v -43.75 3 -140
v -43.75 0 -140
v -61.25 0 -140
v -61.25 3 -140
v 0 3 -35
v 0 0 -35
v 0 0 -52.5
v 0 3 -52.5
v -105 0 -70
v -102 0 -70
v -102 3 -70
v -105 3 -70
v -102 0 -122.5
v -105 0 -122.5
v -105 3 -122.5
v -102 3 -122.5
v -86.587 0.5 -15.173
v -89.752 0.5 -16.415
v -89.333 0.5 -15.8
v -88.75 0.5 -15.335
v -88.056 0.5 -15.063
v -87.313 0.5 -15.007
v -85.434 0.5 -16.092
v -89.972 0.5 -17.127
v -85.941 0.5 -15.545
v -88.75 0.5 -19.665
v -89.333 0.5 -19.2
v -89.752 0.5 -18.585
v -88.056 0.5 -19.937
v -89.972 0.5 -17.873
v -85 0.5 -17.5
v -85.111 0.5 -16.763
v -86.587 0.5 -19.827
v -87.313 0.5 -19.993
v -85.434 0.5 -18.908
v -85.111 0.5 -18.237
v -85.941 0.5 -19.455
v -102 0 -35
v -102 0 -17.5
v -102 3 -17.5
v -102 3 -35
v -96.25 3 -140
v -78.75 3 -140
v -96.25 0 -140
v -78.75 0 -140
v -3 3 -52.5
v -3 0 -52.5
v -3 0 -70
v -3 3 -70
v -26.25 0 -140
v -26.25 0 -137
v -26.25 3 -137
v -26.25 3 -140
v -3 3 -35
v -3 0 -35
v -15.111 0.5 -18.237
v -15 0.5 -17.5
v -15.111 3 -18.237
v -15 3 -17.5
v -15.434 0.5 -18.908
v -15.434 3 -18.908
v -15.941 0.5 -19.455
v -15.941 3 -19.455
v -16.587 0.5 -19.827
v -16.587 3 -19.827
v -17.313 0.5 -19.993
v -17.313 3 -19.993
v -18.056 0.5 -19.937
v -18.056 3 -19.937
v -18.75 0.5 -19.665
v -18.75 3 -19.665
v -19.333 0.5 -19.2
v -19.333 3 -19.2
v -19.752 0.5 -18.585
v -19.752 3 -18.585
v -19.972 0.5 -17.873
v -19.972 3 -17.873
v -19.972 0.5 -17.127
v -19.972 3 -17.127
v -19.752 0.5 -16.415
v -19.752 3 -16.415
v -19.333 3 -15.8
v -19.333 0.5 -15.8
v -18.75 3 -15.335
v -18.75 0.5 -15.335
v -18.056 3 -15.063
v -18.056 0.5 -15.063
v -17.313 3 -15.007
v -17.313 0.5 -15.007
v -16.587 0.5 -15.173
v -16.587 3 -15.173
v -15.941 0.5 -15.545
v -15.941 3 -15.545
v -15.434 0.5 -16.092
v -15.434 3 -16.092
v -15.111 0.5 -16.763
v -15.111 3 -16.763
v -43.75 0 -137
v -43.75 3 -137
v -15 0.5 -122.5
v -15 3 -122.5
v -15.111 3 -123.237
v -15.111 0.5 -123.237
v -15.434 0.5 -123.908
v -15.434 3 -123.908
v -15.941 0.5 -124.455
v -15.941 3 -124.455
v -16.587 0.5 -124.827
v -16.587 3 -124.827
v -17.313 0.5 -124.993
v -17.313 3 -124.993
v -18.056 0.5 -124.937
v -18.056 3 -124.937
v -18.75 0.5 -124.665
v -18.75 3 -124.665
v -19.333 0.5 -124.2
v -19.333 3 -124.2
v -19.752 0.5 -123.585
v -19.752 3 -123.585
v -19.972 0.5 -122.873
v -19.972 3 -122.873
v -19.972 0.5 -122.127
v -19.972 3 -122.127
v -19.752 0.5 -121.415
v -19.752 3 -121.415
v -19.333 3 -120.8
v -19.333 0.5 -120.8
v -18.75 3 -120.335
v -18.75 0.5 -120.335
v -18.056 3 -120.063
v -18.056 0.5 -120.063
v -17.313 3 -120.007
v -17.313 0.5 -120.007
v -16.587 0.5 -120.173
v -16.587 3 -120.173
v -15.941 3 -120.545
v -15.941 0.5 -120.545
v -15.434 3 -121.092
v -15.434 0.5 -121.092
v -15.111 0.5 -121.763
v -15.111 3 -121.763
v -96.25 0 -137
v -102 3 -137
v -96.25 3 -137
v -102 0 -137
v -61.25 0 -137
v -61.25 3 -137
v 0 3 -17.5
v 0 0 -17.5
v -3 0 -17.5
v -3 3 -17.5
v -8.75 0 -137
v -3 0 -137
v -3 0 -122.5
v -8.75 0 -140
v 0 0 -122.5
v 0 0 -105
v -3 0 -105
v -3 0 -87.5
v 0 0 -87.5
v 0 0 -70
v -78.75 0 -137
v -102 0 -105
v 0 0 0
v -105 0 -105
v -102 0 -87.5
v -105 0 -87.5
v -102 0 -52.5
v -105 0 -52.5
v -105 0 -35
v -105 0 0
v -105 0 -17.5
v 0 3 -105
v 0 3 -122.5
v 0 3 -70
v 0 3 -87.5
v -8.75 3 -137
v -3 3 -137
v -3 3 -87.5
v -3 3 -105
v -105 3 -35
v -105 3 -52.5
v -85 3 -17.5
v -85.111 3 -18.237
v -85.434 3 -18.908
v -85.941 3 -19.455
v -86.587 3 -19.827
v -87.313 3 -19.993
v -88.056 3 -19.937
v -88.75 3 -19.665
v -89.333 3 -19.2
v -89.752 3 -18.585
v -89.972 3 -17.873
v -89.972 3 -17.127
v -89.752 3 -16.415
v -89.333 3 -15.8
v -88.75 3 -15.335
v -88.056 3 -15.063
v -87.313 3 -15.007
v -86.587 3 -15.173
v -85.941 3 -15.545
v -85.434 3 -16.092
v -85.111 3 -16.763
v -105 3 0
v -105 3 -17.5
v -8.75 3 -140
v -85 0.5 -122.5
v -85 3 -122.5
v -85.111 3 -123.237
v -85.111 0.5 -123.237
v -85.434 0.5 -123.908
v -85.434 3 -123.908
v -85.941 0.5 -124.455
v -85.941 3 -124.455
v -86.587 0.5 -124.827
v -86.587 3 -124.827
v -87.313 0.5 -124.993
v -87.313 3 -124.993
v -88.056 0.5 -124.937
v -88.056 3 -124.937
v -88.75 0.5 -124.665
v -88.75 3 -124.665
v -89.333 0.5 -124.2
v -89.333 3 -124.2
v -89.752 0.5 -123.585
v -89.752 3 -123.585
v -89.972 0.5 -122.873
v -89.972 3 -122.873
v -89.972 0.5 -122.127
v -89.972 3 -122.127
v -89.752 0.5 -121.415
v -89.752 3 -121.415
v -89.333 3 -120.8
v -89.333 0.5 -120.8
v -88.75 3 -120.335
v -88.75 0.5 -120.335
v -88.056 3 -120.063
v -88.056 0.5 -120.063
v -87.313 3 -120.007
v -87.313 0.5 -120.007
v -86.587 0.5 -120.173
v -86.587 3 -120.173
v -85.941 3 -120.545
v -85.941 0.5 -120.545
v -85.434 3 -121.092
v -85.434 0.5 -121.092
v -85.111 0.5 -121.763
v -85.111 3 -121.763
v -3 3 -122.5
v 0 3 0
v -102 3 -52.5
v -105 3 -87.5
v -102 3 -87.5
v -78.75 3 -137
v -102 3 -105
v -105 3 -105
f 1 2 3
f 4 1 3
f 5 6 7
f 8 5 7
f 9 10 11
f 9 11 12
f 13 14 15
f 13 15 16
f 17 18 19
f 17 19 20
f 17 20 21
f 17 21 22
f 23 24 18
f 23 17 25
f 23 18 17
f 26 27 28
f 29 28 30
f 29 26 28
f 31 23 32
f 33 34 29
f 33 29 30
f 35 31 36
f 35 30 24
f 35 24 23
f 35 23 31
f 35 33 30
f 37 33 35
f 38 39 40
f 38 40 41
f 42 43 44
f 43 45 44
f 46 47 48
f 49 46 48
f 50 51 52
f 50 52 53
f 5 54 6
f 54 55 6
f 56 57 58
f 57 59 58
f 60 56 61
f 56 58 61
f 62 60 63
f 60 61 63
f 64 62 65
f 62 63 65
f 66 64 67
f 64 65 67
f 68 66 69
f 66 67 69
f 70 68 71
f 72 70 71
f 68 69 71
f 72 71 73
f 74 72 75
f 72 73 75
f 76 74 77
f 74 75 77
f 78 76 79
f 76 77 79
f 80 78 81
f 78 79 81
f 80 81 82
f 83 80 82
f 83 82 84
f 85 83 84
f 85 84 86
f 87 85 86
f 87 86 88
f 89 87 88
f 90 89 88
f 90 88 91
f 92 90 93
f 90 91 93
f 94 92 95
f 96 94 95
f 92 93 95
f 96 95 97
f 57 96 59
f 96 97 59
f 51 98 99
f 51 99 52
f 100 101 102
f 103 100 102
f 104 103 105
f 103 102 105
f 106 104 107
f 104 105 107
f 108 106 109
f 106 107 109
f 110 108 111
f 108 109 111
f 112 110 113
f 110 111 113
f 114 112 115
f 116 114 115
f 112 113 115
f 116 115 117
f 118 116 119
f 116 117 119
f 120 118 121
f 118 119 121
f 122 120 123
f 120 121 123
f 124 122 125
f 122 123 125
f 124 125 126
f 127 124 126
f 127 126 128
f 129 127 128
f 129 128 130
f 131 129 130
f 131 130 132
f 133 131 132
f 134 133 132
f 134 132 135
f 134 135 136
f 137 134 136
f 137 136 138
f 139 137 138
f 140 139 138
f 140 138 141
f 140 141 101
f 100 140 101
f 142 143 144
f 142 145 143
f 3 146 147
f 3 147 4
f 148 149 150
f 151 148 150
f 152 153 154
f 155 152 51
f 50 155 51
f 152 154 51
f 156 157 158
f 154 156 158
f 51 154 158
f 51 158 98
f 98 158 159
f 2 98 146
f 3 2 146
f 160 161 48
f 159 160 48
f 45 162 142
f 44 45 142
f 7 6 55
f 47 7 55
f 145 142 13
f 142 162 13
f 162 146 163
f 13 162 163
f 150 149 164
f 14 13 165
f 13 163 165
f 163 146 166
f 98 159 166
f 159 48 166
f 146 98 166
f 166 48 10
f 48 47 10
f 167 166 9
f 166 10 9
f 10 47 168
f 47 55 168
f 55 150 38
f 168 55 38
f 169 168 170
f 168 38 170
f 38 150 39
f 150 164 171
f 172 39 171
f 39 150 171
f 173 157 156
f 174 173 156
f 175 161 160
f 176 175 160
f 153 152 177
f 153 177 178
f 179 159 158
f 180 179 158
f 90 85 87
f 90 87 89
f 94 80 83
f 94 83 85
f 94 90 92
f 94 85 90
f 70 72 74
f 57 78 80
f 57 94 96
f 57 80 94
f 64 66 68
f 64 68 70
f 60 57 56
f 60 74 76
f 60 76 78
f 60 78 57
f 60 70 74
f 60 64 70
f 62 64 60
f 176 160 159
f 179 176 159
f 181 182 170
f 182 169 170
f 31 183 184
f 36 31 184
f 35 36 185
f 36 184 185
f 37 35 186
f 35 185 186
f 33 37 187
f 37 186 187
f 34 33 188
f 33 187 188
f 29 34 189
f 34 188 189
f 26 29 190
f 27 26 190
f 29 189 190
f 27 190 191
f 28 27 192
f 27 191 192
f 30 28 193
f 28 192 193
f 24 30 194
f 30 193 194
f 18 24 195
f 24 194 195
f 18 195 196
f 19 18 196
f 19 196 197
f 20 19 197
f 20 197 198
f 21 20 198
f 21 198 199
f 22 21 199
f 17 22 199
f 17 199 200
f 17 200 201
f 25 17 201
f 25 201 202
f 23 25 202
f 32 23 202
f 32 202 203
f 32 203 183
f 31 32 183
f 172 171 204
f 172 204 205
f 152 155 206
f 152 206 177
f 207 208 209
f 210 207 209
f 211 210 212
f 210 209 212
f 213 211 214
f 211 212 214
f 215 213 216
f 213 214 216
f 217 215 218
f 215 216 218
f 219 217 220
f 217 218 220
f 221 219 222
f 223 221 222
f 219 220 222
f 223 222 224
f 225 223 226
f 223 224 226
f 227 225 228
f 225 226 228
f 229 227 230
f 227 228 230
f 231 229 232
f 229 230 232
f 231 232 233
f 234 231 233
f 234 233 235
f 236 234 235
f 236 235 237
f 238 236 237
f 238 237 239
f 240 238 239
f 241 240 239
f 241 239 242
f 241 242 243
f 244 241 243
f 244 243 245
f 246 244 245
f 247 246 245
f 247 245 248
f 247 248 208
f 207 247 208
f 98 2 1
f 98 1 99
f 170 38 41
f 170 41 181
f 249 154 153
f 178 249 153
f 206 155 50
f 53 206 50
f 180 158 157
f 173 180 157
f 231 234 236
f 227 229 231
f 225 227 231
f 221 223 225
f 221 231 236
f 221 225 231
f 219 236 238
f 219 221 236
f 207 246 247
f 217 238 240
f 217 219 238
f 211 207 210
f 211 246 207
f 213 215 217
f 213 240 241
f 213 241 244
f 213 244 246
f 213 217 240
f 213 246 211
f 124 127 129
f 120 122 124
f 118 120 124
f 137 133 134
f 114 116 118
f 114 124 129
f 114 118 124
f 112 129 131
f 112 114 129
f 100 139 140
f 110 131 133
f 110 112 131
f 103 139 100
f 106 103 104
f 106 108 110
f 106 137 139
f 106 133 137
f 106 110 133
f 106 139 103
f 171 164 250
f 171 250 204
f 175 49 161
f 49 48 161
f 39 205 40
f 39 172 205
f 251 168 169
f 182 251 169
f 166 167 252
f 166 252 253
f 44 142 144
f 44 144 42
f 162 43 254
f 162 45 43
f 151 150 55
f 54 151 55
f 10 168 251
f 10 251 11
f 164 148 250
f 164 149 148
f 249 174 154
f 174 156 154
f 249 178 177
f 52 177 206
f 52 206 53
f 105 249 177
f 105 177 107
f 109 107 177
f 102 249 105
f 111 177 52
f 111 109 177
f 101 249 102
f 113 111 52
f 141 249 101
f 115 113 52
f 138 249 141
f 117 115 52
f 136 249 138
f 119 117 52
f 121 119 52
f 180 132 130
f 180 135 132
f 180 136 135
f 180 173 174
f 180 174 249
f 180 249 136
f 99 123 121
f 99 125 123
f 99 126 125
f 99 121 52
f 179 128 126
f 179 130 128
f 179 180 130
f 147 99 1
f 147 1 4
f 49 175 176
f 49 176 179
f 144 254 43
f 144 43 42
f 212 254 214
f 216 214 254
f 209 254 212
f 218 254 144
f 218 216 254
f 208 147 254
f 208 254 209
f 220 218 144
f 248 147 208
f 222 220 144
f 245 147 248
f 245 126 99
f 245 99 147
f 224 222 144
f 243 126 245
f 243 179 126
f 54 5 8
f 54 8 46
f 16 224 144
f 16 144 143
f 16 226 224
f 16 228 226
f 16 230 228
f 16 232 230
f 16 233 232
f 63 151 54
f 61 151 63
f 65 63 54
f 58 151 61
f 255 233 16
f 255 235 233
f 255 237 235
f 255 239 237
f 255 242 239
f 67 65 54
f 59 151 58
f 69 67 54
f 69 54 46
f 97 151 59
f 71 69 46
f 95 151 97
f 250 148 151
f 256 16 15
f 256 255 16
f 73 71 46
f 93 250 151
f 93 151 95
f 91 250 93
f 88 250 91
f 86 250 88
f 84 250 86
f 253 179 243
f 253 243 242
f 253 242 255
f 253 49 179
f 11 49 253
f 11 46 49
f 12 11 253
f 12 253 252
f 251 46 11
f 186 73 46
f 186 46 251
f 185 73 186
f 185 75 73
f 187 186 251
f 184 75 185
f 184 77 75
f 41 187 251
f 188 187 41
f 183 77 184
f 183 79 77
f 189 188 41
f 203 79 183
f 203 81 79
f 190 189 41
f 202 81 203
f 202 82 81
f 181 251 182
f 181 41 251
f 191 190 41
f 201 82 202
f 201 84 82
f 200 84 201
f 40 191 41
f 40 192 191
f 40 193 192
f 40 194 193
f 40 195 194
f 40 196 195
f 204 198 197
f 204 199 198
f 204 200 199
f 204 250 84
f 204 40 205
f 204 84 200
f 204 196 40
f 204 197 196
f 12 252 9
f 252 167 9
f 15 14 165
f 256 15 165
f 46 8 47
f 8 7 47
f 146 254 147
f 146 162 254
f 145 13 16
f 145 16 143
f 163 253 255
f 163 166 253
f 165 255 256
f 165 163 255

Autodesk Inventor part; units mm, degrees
ref_plane "YZ Plane" through (0, 0, 0) normal (1, 0, 0) x (0, 1, 0)
ref_plane "XZ Plane" through (0, 0, 0) normal (0, 1, 0) x (-1, 0, 0)
ref_plane "XY Plane" through (0, 0, 0) normal (0, 0, 1) x (1, 0, 0)
sketch "Sketch2" plane through (0, 0, 0) normal (0, 1, 0) x (-1, 0, 0)
  line L0 (0, 0) -> (105, 0)
  line L1 (105, 0) -> (105, -140)
  line L2 (105, -140) -> (0, -140)
  line L3 (0, -140) -> (0, 0)
  point P0 (75, -100)
  dimension "d4" = 105
  dimension "d5" = 140
extrude "Extrusion2" add sketch "Sketch2" along normal blind 3
sketch "Sketch3" plane through (0, 0, 0) normal (0, -1, 0) x (1, 0, 0)
  line L0 (-105, 0) -> (0, 0) projected
  line L1 (-105, -140) -> (-105, 0) projected
  line L2 (0, -17.5) -> (-3, -17.5)
  line L3 (-3, -17.5) -> (-3, -35)
  line L4 (-3, -35) -> (0, -35)
  line L5 (0, -35) -> (0, -52.5)
  line L6 (0, -52.5) -> (-3, -52.5)
  line L7 (-3, -52.5) -> (-3, -70)
  line L8 (-3, -70) -> (0, -70)
  line L9 (0, -70) -> (0, -87.5)
  line L10 (0, -87.5) -> (-3, -87.5)
  line L11 (-3, -87.5) -> (-3, -105)
  line L12 (-3, -105) -> (0, -105)
  line L13 (0, -105) -> (0, -122.5)
  line L14 (0, -122.5) -> (-3, -122.5)
  line L15 (-3, -122.5) -> (-3, -140)
  line L16 (0, -17.5) -> (0, 0)
  line L17 (-105, 0) -> (0, 0) projected
  line L18 (-105, -140) -> (-105, 0) projected
  line L19 (0, 0) -> (-105, 0)
  line L20 (-105, 0) -> (-105, -17.5)
  line L21 (-105, -17.5) -> (-102, -17.5)
  line L22 (-102, -17.5) -> (-102, -35)
  line L23 (-102, -35) -> (-105, -35)
  line L24 (-105, -35) -> (-105, -52.5)
  line L25 (-102, -52.5) -> (-105, -52.5)
  line L26 (-102, -52.5) -> (-102, -70)
  line L27 (-102, -70) -> (-105, -70)
  line L28 (-105, -70) -> (-105, -87.5)
  line L29 (-105, -87.5) -> (-102, -87.5)
  line L30 (-102, -87.5) -> (-102, -105)
  line L31 (-102, -105) -> (-105, -105)
  line L32 (-105, -105) -> (-105, -122.5)
  line L33 (-105, -122.5) -> (-102, -122.5)
  line L34 (-102, -122.5) -> (-102, -137)
  line L35 (0, -140) -> (-105, -140) projected
  line L36 (-105, -122.5) -> (-105, -105)
  line L37 (-102, -137) -> (-96.25, -137)
  line L38 (-96.25, -137) -> (-96.25, -140)
  line L39 (-96.25, -140) -> (-78.75, -140)
  line L40 (-52.5, -140) -> (-35, -140)
  line L41 (-17.5, -140) -> (-3, -140)
  line L42 (-3, -140) -> (-3, -137)
  line L43 (-61.25, -140) -> (-43.75, -140)
  line L44 (-43.75, -140) -> (-43.75, -137)
  line L45 (-43.75, -137) -> (-26.25, -137)
  line L46 (-26.25, -137) -> (-26.25, -140)
  line L47 (-26.25, -140) -> (-8.75, -140)
  line L48 (-8.75, -140) -> (-8.75, -137)
  line L49 (-8.75, -137) -> (-3, -137)
  line L50 (-96.25, -137) -> (-96.25, -140)
  line L51 (-96.25, -140) -> (-78.75, -140)
  line L52 (-78.75, -140) -> (-78.75, -137)
  line L53 (-78.75, -137) -> (-61.25, -137)
  line L54 (-61.25, -137) -> (-61.25, -140)
  line L55 (-61.25, -140) -> (-43.75, -140)
  line L56 (-26.25, -140) -> (-8.75, -140)
  point P0 (-17.5, -137)
  dimension "d51" = 3
  dimension "d52" = 17.5
  dimension "d53" = 17.5
  dimension "d54" = 17.5
  dimension "d55" = 17.5
  dimension "d56" = 17.5
  dimension "d58" = 3
  dimension "d65" = 17.5
  dimension "d66" = 17.5
  dimension "d67" = 17.5
  dimension "d69" = 5.75
  dimension "d70" = 5.75
  dimension "d71" = 17.5
extrude "Extrusion3" cut sketch "Sketch3" against normal blind 3 contours L0 L16 L2 L3 L4 L5 L6 L7 L8 L9 L10 L11 L12 L13 L14 L15 L49 L48 L35 L46 L45 L44 L54 L53 L52 L38 L37 L34 L33 L1 L31 L30 L29 L27 L26 L25 L23 L22 L21 keep common part
sketch "Sketch5" plane through (0, 3, 0) normal (0, 1, 0) x (1, 0, 0)
  circle A0 centre (-17.5, 17.5) radius 2.5
  line L0 (0, 0) -> (0, 17.5) projected
  line L1 (0, 0) -> (0, 17.5)
  line L2 (-105, 0) -> (0, 0) projected
  line L3 (0, 0) -> (-17.5, 0)
  circle A1 centre (-87.5, 17.5) radius 2.5
  circle A2 centre (-17.5, 122.5) radius 2.5
  circle A3 centre (-87.5, 122.5) radius 2.5
  dimension "d72" = 17.5
  dimension "d75" = 70
  dimension "d78" = 105
extrude "Extrusion4" cut sketch "Sketch5" against normal blind 2.5
properties part number "TableBottom" material "Wood (Cherry)"
